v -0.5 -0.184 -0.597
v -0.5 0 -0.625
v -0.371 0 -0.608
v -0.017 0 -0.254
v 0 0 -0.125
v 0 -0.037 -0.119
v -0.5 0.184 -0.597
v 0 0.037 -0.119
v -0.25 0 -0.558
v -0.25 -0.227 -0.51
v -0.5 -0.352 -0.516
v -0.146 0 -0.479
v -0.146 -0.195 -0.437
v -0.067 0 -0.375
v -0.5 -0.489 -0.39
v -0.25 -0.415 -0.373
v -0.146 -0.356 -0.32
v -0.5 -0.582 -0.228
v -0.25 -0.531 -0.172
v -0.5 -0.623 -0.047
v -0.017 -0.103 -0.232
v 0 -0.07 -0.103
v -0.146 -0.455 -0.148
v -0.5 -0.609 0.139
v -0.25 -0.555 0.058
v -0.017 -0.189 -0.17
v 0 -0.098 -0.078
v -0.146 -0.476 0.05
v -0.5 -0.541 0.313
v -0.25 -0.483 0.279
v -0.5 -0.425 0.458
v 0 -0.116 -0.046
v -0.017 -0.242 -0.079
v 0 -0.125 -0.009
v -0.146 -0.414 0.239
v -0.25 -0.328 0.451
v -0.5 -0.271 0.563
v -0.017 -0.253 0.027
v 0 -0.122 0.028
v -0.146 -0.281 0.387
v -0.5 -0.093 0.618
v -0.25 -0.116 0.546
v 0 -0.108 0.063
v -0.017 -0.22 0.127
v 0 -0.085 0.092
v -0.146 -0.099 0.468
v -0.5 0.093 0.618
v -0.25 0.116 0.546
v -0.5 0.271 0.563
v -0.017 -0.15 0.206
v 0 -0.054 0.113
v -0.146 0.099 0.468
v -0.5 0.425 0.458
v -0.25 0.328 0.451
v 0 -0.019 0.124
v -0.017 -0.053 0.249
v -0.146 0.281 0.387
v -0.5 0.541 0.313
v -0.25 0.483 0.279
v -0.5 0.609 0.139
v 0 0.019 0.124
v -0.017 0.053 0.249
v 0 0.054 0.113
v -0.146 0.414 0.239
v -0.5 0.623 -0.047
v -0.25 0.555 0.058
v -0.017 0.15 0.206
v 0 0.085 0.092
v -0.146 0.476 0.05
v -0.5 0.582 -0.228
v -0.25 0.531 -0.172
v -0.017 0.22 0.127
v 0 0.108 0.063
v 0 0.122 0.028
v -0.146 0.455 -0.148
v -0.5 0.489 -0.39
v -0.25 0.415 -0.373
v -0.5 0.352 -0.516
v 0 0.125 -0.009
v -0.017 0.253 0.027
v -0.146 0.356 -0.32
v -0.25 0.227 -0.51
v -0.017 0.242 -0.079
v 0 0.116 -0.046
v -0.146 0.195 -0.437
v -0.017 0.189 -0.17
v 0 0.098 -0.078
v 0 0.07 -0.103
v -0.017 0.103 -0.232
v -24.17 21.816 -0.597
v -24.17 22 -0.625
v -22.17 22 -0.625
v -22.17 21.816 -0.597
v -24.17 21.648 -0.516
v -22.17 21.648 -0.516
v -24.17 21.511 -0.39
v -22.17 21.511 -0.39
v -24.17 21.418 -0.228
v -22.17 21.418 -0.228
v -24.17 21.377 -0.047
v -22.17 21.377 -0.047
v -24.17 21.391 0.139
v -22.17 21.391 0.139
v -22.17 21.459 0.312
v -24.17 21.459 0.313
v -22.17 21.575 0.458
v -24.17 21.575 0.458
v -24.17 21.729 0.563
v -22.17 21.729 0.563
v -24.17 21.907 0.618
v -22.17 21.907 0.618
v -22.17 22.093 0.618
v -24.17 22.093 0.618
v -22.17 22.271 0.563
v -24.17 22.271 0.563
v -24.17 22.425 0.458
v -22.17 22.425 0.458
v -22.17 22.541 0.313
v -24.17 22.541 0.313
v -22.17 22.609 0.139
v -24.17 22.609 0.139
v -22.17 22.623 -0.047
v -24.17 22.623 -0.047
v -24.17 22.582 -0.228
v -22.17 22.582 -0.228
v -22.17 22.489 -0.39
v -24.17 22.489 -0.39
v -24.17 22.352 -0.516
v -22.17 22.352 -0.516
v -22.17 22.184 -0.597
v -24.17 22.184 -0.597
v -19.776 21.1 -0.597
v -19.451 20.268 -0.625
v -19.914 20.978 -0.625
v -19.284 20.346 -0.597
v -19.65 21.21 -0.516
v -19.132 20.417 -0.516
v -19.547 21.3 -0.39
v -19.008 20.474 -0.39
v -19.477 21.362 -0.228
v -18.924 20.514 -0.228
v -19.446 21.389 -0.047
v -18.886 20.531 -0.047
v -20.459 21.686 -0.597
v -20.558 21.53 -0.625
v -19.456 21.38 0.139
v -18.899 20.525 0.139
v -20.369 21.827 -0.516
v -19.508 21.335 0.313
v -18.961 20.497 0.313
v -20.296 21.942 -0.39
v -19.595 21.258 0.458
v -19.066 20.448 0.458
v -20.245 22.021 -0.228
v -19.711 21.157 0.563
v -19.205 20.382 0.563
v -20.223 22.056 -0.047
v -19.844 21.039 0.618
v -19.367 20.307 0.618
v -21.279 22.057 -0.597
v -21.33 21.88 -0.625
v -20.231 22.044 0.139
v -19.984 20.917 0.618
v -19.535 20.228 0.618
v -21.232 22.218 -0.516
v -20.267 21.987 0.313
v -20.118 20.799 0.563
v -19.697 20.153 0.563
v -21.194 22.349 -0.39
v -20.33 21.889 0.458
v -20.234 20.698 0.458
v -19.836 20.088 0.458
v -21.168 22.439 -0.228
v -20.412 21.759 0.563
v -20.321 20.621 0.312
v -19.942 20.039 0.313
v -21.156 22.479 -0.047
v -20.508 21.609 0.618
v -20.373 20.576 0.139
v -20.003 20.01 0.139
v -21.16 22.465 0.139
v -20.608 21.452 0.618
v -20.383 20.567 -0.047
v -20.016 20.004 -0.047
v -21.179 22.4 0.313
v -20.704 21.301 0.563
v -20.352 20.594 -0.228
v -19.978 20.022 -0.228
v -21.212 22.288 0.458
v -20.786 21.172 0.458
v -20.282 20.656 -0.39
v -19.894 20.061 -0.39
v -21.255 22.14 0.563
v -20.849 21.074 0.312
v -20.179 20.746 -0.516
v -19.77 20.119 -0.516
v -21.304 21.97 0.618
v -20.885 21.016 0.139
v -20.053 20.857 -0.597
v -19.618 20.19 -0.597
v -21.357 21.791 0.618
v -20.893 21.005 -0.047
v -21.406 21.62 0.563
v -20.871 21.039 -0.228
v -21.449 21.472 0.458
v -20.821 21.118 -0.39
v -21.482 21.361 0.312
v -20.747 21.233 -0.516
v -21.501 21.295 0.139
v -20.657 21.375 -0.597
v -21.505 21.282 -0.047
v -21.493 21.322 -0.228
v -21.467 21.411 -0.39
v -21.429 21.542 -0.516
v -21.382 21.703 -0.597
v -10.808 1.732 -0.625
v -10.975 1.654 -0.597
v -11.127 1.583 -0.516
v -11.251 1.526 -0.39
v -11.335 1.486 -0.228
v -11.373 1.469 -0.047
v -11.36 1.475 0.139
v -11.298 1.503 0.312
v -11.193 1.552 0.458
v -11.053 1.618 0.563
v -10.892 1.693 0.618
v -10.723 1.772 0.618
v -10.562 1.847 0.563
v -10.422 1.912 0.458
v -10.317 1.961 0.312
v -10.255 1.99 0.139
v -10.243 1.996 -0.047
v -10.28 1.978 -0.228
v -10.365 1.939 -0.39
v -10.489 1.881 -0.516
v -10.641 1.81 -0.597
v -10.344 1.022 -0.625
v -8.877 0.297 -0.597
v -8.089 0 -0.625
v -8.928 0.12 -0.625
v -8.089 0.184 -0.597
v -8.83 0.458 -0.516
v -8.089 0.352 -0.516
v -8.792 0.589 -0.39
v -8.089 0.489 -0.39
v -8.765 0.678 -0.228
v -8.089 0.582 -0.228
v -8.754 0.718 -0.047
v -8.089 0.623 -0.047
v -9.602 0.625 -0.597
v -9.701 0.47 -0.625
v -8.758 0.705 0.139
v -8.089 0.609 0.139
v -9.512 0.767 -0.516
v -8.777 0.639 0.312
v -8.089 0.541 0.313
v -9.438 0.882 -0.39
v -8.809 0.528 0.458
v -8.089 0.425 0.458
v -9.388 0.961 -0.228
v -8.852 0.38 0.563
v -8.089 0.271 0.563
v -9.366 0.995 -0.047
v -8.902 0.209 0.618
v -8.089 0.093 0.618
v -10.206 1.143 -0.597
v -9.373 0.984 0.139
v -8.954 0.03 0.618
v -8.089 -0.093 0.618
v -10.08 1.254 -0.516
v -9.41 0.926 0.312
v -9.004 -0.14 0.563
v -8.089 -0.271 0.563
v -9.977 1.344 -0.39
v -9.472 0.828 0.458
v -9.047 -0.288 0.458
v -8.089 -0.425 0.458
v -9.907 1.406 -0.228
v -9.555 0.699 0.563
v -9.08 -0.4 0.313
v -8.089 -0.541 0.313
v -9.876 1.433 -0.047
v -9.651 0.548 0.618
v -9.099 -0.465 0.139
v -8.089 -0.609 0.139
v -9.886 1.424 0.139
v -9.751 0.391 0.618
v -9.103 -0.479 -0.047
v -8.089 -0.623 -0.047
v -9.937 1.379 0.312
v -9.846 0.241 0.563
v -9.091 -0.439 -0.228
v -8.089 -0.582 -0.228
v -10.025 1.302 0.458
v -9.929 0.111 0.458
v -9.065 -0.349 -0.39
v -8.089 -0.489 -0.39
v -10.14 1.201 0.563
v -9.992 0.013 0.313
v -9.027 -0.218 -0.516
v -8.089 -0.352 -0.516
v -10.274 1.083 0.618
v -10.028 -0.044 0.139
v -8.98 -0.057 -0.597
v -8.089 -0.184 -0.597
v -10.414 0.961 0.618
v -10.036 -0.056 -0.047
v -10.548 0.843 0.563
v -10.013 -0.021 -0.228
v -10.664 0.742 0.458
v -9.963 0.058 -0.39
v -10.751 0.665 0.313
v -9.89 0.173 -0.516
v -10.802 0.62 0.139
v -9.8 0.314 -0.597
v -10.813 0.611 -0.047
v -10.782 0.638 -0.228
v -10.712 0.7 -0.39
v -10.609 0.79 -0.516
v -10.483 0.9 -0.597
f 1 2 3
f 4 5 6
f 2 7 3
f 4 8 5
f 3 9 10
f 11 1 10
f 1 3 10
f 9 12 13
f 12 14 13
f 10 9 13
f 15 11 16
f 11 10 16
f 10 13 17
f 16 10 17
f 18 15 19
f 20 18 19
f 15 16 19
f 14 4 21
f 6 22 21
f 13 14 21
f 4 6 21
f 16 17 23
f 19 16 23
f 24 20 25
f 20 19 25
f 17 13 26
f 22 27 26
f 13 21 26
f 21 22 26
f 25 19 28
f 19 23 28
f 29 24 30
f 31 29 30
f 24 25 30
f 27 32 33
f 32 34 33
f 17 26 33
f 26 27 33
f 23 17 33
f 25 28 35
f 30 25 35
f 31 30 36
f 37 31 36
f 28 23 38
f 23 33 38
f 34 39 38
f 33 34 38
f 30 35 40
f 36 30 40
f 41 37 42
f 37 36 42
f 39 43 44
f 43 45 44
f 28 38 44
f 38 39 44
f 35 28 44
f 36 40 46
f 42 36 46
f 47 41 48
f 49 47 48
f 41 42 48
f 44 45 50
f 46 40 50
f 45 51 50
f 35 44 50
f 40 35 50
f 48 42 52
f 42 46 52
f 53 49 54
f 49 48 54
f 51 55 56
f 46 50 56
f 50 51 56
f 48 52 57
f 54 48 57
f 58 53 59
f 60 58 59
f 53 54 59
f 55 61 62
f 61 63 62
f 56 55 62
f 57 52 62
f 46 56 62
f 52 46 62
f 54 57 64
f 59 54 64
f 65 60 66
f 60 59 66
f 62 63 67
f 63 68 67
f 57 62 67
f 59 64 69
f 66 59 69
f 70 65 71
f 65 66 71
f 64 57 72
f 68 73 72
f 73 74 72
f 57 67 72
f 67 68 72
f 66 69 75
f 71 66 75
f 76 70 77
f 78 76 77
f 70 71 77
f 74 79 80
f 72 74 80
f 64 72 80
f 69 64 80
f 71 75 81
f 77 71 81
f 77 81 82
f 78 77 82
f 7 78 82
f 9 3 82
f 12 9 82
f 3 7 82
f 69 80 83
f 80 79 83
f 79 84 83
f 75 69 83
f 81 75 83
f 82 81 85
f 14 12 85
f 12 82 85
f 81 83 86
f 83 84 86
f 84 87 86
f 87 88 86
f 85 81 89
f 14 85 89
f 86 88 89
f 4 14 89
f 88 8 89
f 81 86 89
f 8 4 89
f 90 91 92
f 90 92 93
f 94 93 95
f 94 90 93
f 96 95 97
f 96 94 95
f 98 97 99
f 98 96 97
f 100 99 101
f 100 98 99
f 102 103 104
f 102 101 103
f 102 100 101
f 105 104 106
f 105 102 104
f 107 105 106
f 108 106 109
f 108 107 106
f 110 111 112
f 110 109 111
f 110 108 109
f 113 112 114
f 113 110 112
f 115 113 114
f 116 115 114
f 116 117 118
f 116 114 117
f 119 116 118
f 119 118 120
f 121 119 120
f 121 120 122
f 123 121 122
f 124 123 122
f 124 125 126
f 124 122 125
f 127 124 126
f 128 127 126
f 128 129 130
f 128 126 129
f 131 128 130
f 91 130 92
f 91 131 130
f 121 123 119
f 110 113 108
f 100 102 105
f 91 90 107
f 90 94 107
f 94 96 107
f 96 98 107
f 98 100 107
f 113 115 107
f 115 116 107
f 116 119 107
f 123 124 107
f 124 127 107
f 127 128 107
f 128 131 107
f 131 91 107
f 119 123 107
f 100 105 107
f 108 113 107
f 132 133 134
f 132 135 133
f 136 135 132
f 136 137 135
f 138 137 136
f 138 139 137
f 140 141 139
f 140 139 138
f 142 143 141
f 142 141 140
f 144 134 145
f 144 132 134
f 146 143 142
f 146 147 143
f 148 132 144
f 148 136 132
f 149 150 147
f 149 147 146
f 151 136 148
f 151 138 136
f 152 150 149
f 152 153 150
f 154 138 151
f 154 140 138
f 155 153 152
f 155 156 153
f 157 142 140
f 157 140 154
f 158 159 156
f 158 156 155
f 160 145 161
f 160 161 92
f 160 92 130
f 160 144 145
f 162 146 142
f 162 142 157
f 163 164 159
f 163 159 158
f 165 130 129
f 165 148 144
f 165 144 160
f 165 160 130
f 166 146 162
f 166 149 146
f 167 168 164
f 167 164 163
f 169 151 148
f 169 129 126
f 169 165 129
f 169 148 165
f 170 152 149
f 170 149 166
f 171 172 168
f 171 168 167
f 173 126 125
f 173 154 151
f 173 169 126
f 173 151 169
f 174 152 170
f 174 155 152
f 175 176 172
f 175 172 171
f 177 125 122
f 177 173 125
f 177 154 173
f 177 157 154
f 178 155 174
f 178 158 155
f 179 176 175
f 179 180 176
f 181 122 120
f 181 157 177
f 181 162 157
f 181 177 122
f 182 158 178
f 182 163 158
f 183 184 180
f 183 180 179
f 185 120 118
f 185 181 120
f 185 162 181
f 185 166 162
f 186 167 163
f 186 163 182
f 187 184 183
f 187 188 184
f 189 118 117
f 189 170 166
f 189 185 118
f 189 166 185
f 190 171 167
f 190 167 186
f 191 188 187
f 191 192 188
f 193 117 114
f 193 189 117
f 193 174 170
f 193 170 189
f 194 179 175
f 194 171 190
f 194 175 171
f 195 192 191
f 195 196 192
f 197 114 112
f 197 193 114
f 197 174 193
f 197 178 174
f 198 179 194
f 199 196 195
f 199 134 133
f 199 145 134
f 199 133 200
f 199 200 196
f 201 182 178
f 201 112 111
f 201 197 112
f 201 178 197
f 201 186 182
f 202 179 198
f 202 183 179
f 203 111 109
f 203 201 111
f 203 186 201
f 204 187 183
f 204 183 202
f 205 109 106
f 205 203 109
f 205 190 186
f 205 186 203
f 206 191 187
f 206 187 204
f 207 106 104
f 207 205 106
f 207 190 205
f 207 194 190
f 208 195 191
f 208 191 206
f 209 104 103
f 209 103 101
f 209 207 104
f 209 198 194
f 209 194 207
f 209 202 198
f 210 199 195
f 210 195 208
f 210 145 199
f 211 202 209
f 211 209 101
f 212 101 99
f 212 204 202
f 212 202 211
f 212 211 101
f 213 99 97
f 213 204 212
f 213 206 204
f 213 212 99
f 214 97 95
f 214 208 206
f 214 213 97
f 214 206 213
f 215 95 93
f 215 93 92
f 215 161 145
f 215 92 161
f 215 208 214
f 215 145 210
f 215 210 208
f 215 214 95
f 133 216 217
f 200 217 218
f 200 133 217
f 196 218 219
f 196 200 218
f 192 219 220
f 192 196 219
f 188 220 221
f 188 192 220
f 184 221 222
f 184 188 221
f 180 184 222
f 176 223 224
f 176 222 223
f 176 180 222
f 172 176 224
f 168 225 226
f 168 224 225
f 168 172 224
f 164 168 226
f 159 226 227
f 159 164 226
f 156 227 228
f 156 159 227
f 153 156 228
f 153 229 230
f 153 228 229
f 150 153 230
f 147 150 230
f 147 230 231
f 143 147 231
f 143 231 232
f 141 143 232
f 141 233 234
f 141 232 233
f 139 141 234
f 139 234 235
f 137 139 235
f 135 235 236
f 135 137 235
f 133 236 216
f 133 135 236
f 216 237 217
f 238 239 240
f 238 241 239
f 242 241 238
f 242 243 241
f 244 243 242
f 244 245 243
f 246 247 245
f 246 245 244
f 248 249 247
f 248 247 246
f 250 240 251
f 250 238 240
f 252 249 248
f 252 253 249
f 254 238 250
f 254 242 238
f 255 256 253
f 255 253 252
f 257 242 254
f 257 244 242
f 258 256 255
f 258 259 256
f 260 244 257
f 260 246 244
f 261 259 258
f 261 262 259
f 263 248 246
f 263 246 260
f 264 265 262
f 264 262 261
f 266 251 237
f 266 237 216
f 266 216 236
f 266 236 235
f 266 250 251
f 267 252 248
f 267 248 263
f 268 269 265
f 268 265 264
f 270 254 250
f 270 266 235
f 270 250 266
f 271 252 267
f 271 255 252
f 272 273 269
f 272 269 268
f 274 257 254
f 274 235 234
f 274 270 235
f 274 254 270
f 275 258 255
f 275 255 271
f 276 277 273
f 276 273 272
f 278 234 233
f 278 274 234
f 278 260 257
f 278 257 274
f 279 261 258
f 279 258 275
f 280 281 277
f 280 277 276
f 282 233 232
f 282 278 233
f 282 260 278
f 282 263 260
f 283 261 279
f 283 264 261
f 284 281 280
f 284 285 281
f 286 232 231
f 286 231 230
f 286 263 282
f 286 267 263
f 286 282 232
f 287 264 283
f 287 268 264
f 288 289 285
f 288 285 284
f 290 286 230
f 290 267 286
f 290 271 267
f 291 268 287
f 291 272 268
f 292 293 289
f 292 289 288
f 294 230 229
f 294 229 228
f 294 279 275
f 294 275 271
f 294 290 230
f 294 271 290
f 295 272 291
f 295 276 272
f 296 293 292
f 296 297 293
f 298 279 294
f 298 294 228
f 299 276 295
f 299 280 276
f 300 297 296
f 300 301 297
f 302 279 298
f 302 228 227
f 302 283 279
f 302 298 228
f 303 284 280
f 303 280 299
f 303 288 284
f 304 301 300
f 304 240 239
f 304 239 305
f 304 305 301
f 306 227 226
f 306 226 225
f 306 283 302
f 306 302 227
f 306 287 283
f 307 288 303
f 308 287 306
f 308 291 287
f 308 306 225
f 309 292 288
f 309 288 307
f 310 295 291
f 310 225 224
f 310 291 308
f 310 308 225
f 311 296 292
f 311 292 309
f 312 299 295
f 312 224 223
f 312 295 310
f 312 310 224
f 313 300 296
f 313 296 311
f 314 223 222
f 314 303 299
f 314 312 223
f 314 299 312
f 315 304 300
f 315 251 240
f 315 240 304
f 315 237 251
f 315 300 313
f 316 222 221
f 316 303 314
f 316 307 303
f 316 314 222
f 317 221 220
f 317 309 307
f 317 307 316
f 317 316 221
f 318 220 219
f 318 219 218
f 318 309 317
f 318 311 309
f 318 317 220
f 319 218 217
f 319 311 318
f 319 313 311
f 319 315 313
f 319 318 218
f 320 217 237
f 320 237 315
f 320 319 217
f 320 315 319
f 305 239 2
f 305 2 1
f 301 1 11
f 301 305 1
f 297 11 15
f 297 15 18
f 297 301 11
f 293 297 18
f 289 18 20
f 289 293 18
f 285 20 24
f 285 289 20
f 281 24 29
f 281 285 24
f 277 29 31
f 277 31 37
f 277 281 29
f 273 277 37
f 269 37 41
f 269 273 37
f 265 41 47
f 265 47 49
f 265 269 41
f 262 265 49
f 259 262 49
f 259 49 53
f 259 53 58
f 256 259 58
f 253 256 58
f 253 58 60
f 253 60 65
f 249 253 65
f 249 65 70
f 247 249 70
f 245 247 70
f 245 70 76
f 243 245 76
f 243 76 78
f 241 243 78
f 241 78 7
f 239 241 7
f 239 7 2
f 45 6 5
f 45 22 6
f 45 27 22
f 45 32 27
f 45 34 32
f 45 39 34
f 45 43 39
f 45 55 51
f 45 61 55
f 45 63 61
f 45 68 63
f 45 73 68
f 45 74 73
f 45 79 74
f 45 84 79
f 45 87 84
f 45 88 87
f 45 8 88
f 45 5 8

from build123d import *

# Parameters (mm, degrees)
SKETCH2_R = 0.625
FILLET2_R = 0.5


with BuildPart() as part:
    # Sweep1: sweep along a path in Sketch1
    with BuildLine(Plane.XY) as sweep1_path:
        Line((0, 0), (-8.088789218, 0))
        ThreePointArc((-8.088789218, 0), (-9.700688043, 0.469825663), (-10.807712579, 1.732145215))
        Line((-10.807712579, 1.732145215), (-19.451055901, 20.267854785))
        ThreePointArc((-19.451055901, 20.267854785), (-20.558080437, 21.530174337), (-22.169979262, 22))
        Line((-22.169979262, 22), (-24.169979262, 22))
    # Sketch2 → Sweep1 (sweep)
    with BuildSketch(Plane(origin=(0, 0, 0), x_dir=(0, 0, -1), z_dir=(1, 0, 0))):
        Circle(SKETCH2_R)
    sweep(path=sweep1_path.line)

    # Fillet2
    fillet2_edges = [part.edges().sort_by_distance(p)[0] for p in [
        (0, 0, 0.625),
    ]]
    fillet(fillet2_edges, radius=FILLET2_R)


solid = part.part
